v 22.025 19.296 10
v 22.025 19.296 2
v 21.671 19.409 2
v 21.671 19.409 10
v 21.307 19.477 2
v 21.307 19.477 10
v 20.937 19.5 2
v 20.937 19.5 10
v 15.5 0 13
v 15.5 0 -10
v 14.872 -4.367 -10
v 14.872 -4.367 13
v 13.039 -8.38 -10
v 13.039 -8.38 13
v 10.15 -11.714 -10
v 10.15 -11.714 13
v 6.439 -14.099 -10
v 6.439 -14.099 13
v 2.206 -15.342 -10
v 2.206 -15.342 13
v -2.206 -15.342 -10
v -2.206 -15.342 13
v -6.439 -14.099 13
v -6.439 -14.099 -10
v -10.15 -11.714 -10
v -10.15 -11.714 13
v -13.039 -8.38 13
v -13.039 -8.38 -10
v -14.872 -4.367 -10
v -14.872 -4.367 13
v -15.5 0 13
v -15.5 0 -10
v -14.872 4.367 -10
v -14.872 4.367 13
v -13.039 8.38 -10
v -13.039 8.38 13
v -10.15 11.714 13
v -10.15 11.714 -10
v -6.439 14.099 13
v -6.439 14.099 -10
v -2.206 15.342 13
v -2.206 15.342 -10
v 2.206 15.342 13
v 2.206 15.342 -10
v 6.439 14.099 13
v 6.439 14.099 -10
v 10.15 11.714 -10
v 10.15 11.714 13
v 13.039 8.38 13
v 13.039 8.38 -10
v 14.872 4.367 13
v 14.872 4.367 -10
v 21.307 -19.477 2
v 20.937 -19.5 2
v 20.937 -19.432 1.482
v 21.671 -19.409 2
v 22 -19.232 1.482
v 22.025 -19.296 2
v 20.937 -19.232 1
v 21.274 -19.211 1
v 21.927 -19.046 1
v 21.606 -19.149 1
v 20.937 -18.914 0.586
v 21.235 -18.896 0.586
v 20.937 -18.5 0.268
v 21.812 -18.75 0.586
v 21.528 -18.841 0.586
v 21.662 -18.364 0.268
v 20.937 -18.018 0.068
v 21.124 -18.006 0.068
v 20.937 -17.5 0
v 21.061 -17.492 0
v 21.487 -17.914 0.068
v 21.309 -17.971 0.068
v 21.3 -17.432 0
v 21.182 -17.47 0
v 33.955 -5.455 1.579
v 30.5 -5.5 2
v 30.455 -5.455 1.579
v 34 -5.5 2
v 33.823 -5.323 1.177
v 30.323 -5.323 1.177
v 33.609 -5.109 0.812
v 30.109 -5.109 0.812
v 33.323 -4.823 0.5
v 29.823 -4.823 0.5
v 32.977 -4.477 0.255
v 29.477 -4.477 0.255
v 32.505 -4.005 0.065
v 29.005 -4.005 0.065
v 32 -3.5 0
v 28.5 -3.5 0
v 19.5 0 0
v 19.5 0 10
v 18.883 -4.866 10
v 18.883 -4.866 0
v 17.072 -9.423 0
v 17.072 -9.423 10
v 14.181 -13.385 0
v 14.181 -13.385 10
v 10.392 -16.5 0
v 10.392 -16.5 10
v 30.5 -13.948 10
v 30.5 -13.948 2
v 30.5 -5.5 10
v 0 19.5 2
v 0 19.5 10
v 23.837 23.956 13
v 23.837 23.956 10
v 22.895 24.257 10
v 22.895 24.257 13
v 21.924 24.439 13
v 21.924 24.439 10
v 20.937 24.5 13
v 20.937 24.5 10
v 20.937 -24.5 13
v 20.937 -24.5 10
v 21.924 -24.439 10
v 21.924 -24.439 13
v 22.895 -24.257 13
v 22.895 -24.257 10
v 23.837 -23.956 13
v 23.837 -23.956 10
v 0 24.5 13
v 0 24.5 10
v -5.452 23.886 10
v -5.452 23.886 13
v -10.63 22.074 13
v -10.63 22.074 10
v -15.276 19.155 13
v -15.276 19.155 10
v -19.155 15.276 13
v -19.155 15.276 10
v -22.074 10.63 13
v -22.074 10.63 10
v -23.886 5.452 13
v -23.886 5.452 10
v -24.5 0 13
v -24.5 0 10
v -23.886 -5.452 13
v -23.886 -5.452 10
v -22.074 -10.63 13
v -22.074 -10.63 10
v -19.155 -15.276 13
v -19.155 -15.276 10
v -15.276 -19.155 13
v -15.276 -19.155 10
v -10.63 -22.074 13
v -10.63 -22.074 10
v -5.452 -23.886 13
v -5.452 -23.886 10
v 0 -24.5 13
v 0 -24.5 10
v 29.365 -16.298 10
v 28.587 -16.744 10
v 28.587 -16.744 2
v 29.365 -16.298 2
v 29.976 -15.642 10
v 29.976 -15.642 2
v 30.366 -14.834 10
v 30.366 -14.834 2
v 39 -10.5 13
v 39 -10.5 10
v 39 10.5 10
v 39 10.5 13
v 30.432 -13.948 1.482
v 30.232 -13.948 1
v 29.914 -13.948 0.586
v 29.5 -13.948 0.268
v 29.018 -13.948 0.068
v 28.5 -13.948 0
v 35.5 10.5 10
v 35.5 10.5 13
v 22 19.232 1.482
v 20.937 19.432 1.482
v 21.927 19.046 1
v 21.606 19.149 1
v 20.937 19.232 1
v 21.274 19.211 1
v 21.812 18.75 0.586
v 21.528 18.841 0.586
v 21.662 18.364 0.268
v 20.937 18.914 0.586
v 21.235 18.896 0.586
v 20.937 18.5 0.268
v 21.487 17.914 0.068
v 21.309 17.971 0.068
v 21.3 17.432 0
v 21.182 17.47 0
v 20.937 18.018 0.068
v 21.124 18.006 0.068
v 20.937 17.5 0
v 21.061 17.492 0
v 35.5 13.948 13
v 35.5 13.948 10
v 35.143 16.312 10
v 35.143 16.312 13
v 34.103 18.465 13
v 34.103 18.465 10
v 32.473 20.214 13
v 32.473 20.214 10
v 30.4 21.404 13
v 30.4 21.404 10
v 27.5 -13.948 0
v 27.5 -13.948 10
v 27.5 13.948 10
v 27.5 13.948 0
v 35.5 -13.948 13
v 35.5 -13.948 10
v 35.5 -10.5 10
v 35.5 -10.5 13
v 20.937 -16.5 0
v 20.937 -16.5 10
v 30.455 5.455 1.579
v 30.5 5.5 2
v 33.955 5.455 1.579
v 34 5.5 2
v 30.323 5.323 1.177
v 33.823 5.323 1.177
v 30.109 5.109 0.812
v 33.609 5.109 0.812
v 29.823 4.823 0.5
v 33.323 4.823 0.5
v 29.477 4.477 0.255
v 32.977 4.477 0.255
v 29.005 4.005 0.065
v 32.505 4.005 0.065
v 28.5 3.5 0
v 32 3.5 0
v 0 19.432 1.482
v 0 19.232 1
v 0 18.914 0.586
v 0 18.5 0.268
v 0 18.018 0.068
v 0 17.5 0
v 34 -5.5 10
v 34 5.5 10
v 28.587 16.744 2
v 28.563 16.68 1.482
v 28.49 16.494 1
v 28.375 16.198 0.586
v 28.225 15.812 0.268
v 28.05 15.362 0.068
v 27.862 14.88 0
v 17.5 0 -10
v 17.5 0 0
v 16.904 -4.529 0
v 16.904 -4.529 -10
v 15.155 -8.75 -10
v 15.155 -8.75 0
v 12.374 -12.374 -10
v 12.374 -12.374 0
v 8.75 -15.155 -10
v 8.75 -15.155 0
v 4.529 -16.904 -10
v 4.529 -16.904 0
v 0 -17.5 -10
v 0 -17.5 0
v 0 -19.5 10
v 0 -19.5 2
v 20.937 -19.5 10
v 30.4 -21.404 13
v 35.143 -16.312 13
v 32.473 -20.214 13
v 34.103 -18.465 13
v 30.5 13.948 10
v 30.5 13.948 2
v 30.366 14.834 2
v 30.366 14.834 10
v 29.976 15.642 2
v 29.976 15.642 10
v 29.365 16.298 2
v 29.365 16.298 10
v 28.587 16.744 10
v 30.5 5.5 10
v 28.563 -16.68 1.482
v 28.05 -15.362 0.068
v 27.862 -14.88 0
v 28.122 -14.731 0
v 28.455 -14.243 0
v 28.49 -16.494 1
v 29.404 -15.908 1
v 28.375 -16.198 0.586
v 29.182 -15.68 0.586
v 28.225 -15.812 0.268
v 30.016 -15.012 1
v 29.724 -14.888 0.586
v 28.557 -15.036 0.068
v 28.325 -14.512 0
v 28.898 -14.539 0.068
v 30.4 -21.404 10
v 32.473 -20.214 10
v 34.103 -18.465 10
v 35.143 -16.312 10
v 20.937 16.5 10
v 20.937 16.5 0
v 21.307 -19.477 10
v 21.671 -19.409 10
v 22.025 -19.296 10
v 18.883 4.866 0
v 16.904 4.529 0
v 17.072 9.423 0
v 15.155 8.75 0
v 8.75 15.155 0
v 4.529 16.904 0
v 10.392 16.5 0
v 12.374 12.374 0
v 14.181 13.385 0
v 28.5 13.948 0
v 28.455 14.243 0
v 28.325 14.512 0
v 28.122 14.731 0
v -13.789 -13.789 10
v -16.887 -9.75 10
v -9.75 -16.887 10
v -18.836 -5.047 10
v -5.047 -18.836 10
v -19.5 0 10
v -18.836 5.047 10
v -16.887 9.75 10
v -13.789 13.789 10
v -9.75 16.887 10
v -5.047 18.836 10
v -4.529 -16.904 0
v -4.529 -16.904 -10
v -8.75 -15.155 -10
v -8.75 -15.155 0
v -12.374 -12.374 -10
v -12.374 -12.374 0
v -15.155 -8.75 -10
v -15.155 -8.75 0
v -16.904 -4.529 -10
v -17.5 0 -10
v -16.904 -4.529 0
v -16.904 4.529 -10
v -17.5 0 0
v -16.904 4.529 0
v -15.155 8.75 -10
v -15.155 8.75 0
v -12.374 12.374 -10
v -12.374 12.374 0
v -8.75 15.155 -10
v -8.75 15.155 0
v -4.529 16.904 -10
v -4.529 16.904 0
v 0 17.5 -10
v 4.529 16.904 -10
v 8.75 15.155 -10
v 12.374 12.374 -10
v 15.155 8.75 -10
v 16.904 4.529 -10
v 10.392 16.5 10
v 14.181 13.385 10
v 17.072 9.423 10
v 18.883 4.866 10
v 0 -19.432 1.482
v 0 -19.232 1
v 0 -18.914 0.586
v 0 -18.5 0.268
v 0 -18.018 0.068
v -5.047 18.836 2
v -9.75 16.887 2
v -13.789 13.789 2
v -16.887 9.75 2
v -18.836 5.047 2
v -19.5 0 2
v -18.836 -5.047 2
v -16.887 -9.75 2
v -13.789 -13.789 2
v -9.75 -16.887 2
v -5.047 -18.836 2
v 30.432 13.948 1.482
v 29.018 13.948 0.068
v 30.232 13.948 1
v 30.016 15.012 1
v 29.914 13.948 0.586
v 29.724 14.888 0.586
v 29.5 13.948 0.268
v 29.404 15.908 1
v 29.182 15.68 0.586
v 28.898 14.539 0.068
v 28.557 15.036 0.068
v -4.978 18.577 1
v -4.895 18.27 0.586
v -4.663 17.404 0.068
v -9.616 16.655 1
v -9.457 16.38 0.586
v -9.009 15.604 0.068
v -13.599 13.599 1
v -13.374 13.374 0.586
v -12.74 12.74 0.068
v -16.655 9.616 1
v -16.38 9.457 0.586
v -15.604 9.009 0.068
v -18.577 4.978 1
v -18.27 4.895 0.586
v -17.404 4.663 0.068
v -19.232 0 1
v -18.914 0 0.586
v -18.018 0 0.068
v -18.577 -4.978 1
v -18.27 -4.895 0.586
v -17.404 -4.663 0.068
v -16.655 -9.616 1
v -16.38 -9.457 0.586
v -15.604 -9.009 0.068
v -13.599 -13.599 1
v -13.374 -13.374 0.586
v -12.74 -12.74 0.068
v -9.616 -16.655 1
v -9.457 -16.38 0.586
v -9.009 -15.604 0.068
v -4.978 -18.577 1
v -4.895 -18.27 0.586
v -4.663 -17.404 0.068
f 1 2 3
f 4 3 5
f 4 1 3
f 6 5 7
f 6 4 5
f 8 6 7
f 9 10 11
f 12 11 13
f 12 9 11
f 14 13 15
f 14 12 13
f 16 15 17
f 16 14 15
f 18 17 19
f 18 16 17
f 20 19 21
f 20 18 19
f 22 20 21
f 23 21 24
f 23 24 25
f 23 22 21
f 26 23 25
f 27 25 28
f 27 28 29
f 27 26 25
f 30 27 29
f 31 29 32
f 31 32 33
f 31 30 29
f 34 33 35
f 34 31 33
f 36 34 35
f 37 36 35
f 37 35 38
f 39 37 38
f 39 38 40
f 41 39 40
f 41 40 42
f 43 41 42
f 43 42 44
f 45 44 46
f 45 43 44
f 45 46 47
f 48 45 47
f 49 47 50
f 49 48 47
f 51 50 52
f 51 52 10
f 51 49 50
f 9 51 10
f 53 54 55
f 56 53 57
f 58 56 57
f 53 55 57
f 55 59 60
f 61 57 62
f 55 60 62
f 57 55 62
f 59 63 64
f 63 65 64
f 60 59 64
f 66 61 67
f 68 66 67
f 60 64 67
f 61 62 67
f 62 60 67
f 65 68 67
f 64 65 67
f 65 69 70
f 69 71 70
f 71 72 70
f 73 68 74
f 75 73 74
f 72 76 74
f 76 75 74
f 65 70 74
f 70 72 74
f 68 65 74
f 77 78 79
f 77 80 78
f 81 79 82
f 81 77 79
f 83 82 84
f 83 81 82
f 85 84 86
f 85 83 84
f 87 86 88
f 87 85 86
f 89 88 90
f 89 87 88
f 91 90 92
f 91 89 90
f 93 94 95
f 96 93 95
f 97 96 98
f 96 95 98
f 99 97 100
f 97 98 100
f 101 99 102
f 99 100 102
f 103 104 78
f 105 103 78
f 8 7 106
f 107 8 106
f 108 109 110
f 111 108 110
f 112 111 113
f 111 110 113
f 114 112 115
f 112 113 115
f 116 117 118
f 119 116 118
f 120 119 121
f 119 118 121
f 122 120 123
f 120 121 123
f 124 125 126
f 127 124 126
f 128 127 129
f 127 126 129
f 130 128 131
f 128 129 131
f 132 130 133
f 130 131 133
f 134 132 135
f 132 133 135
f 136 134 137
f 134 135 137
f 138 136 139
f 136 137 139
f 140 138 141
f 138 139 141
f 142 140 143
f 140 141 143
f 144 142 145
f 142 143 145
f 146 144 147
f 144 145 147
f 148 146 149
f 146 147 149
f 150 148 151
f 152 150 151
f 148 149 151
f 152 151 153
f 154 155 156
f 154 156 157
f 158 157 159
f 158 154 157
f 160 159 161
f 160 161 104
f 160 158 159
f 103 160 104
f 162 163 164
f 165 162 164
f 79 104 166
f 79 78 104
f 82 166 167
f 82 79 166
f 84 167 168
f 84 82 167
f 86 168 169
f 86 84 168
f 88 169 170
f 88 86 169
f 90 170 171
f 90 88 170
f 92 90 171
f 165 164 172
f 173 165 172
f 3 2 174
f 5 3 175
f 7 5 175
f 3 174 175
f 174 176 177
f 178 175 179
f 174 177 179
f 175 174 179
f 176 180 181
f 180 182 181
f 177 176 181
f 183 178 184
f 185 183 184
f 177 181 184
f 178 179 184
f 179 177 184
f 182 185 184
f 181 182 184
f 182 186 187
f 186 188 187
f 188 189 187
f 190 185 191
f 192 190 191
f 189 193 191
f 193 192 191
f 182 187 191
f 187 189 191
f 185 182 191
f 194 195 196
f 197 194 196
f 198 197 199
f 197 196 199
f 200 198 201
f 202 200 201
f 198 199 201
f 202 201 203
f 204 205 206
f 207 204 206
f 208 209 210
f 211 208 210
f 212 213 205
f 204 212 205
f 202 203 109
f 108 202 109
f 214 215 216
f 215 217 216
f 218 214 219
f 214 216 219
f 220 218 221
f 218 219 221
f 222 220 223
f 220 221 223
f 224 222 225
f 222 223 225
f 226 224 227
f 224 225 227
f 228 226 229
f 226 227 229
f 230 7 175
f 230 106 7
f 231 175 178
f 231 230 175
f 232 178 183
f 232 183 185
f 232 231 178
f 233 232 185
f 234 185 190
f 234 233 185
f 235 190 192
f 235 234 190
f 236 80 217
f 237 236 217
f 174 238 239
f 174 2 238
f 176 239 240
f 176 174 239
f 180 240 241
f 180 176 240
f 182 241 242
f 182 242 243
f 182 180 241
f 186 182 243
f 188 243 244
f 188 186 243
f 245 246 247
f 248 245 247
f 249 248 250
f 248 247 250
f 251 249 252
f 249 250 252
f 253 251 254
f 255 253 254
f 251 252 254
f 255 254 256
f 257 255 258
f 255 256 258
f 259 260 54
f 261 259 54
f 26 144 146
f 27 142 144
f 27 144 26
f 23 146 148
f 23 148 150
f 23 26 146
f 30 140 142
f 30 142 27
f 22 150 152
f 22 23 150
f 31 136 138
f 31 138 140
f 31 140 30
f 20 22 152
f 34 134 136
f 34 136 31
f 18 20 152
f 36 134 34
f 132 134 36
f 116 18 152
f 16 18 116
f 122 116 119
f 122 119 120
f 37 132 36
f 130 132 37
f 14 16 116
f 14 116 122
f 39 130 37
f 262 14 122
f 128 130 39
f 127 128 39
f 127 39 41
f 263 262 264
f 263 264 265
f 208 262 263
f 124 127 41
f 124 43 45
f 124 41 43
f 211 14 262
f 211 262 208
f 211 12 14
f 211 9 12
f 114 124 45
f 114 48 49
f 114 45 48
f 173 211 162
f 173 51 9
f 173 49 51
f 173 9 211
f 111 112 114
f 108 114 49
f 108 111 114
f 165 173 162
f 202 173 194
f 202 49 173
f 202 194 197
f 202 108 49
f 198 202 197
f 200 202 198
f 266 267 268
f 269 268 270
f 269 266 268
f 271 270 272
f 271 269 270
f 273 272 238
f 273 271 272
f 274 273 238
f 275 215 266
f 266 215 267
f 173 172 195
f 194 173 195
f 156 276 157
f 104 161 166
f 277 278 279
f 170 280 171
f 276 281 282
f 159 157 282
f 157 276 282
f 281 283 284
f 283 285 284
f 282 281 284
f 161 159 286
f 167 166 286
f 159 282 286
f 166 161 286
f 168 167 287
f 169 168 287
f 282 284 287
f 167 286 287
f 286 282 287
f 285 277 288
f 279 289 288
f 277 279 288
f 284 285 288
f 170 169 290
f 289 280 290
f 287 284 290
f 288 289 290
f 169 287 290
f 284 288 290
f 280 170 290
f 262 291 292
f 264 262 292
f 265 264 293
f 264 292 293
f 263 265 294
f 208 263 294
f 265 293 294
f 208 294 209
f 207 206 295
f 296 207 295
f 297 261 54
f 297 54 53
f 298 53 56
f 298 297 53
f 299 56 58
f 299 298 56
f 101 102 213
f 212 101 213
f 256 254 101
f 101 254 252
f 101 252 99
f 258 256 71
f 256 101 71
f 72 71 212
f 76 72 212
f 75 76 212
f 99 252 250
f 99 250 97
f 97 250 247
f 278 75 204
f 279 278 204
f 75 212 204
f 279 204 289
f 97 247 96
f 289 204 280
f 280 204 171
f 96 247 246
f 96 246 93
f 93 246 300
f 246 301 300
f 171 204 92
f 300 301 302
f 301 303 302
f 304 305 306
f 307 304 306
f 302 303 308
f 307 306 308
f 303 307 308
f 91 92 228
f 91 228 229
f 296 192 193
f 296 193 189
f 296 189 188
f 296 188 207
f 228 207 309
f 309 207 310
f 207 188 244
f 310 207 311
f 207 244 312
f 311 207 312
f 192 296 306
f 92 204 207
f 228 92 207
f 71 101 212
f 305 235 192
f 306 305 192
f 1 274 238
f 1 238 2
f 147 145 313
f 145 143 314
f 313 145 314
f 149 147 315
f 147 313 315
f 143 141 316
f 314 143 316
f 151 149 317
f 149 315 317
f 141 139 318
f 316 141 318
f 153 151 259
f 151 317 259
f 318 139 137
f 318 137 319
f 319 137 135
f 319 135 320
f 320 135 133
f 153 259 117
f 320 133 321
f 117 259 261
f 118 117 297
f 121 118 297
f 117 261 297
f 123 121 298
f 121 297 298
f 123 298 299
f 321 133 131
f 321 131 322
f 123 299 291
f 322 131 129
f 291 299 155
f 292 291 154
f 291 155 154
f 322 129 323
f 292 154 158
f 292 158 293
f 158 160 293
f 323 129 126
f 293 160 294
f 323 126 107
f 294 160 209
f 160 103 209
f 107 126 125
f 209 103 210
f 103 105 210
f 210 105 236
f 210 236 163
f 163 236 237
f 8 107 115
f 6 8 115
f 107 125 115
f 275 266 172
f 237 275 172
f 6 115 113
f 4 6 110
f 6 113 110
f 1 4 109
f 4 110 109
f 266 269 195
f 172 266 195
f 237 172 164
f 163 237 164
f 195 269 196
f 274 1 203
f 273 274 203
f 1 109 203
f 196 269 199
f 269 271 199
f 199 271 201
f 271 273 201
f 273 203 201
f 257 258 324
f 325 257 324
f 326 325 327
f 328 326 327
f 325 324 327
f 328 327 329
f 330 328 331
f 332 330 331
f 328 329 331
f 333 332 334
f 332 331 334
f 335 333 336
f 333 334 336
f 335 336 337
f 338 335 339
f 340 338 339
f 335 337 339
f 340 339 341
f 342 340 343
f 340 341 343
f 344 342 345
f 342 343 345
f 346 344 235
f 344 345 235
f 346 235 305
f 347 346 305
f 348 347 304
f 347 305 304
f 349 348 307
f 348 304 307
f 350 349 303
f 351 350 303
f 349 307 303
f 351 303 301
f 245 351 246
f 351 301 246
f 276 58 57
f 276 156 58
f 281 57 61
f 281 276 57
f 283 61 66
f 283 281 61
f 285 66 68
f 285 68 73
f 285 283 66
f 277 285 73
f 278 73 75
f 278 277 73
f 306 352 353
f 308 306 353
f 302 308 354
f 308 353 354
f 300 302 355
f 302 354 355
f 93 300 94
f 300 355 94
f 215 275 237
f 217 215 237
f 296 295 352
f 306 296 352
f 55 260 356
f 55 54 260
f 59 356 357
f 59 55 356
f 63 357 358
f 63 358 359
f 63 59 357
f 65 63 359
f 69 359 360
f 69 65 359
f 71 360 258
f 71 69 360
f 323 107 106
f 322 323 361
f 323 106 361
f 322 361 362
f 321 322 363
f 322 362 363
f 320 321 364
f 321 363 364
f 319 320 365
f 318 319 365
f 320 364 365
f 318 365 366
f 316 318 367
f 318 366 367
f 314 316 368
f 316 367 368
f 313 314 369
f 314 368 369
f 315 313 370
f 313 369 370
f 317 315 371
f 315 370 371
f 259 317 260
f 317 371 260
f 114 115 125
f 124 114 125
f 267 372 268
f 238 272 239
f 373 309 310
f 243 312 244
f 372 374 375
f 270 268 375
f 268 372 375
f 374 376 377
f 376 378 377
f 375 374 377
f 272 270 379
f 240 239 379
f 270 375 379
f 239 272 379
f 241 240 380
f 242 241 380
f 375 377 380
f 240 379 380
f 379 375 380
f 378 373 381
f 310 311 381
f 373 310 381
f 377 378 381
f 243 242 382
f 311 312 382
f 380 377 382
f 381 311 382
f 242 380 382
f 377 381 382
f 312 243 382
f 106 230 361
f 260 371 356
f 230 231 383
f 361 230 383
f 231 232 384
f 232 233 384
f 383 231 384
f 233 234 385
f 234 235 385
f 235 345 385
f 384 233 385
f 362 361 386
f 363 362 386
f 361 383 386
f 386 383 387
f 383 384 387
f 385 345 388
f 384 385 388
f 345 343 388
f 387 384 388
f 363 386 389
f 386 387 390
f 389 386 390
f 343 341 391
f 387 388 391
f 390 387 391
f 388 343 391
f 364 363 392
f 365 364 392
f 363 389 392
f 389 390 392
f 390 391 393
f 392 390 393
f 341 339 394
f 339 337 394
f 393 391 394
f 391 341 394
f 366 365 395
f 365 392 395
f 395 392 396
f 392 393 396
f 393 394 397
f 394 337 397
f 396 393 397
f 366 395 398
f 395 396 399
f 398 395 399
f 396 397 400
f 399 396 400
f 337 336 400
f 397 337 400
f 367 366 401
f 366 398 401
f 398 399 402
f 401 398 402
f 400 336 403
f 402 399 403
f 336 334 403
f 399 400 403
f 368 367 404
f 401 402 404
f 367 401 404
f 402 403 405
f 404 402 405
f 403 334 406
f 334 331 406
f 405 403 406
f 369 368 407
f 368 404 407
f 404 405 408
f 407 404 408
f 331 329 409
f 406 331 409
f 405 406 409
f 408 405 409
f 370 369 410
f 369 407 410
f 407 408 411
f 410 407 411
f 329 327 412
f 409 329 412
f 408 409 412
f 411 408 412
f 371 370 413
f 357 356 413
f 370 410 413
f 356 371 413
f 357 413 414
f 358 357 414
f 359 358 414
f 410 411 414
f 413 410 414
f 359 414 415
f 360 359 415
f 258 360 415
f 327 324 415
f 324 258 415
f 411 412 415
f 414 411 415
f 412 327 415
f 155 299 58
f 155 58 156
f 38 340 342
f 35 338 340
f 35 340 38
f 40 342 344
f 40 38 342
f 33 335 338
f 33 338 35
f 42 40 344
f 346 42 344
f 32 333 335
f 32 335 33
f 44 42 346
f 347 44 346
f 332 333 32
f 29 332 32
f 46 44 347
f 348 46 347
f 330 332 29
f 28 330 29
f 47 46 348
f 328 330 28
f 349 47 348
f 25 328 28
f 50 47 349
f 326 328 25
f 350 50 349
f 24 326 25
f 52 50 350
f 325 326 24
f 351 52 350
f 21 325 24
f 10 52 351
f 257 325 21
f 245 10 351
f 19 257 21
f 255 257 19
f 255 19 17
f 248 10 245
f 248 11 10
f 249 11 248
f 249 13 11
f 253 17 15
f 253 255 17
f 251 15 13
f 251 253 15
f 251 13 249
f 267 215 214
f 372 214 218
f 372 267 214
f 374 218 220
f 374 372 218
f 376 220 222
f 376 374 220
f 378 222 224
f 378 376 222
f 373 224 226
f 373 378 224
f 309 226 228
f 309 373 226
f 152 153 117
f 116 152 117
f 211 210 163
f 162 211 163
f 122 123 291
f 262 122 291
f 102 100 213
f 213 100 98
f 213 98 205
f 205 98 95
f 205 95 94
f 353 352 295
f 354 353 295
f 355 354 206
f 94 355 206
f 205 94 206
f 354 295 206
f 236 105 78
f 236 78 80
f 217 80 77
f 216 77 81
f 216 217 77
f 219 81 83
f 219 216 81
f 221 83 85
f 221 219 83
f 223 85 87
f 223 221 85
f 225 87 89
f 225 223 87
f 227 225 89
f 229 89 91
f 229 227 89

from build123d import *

# Parameters (mm, degrees)
F0_W     = 3.5
F0_H     = 11
F1_DEPTH = 10
F2_R     = 3
F3_R     = 15.5
F4_DEPTH = 25
F3_W     = 3.5
F3_H     = 5
F5_DEPTH = 3
F6_R     = 2
F7_R     = 15.5
F8_DEPTH = 10


with BuildPart() as f1:
    # F0 (on Top) → F1 (new body)
    with BuildSketch(Plane.XY):
        with BuildLine():
            ThreePointArc((0, -19.5), (13.7885822331, -13.7885822331), (19.5, 0))
            ThreePointArc((19.5, 0), (13.7885822331, 13.7885822331), (0, 19.5))
            ThreePointArc((0, 19.5), (-19.5, 0), (0, -19.5))
        make_face()
        with BuildLine():
            ThreePointArc((0, 19.5), (13.7885822331, 13.7885822331), (19.5, 0))
            ThreePointArc((19.5, 0), (13.7885822331, -13.7885822331), (0, -19.5))
            Line((0, -19.5), (21.5, -19.5))
            Line((21.5, -19.5), (21.5, 19.5))
            Line((21.5, 19.5), (0, 19.5))
        make_face()
        Polygon((30.5, 16), (21.5, 19.5), (21.5, -19.5), (30.5, -16), (30.5, -5.5), (30.5, 5.5), align=None)
        with Locations((32.25, 0)):
            Rectangle(F0_W, F0_H)
    extrude(amount=F1_DEPTH)

    # F2
    f2_edges = [f1.edges().sort_by_distance(p)[0] for p in [
        (30.5, 16, 5),
        (21.5, 19.5, 5),
        (30.5, -16, 5),
        (21.5, -19.5, 5),
    ]]
    fillet(f2_edges, radius=F2_R)

    # F3 (on face) → F4 (cut)
    with BuildSketch(Plane.XY.offset(10)):
        Circle(F3_R)
        with BuildLine():
            Line((20.9371966075, 16.5), (10.3923048454, 16.5))
            ThreePointArc((10.3923048454, 16.5), (17.0719059347, 9.4233766643), (19.5, 0))
            ThreePointArc((19.5, 0), (17.0719059347, -9.4233766643), (10.3923048454, -16.5))
            Line((10.3923048454, -16.5), (20.9371966075, -16.5))
            Line((20.9371966075, -16.5), (27.5, -13.9477986807))
            Line((27.5, -13.9477986807), (27.5, -2.5))
            Line((27.5, -2.5), (27.5, 2.5))
            Line((27.5, 2.5), (27.5, 13.9477986807))
            Line((27.5, 13.9477986807), (20.9371966075, 16.5))
        make_face()
    extrude(amount=-F4_DEPTH, mode=Mode.SUBTRACT)

    # F3 (on face) → F5 (join)
    with BuildSketch(Plane.XY.offset(10)):
        with BuildLine():
            Line((20.9371966075, 24.5), (0, 24.5))
            ThreePointArc((0, 24.5), (-24.5, 0), (0, -24.5))
            Line((0, -24.5), (20.9371966075, -24.5))
            ThreePointArc((20.9371966075, -24.5), (22.4122730498, -24.3628334263), (23.8367666967, -23.9560373723))
            Line((23.8367666967, -23.9560373723), (30.3995700892, -21.403836053))
            ThreePointArc((30.3995700892, -21.403836053), (34.1028993902, -18.4646249606), (35.5, -13.9477986807))
            Line((35.5, -13.9477986807), (35.5, -10.5))
            Line((35.5, -10.5), (39, -10.5))
            Line((39, -10.5), (39, 10.5))
            Line((39, 10.5), (35.5, 10.5))
            Line((35.5, 10.5), (35.5, 13.9477986807))
            ThreePointArc((35.5, 13.9477986807), (34.1028993902, 18.4646249606), (30.3995700892, 21.403836053))
            Line((30.3995700892, 21.403836053), (23.8367666967, 23.9560373723))
            ThreePointArc((23.8367666967, 23.9560373723), (22.4122730498, 24.3628334263), (20.9371966075, 24.5))
        make_face()
        with BuildLine():
            ThreePointArc((0, -19.5), (-19.5, 0), (0, 19.5))
            Line((0, 19.5), (20.9371966075, 19.5))
            ThreePointArc((20.9371966075, 19.5), (21.4903502734, 19.4485625349), (22.024535391, 19.2960140146))
            Line((22.024535391, 19.2960140146), (28.5873387835, 16.7438126953))
            ThreePointArc((28.5873387835, 16.7438126953), (29.9760872713, 15.6416085357), (30.5, 13.9477986807))
            Line((30.5, 13.9477986807), (30.5, 5.5))
            Line((30.5, 5.5), (34, 5.5))
            Line((34, 5.5), (34, -5.5))
            Line((34, -5.5), (30.5, -5.5))
            Line((30.5, -5.5), (30.5, -13.9477986807))
            ThreePointArc((30.5, -13.9477986807), (29.9760872713, -15.6416085357), (28.5873387835, -16.7438126953))
            Line((28.5873387835, -16.7438126953), (22.024535391, -19.2960140146))
            ThreePointArc((22.024535391, -19.2960140146), (21.4903502734, -19.4485625349), (20.9371966075, -19.5))
            Line((20.9371966075, -19.5), (0, -19.5))
        make_face(mode=Mode.SUBTRACT)
        with BuildLine():
            ThreePointArc((0, -16.5), (-16.5, 0), (0, 16.5))
            Line((0, 16.5), (10.3923048454, 16.5))
            ThreePointArc((10.3923048454, 16.5), (5.4083269132, 18.7349939952), (0, 19.5))
            ThreePointArc((0, 19.5), (-19.5, 0), (0, -19.5))
            ThreePointArc((0, -19.5), (5.4083269132, -18.7349939952), (10.3923048454, -16.5))
            Line((10.3923048454, -16.5), (0, -16.5))
        make_face()
        with Locations((29.25, 0)):
            Rectangle(F3_W, F3_H)
        with BuildLine():
            ThreePointArc((0, 19.5), (5.4083269132, 18.7349939952), (10.3923048454, 16.5))
            Line((10.3923048454, 16.5), (20.9371966075, 16.5))
            Line((20.9371966075, 16.5), (27.5, 13.9477986807))
            Line((27.5, 13.9477986807), (27.5, 2.5))
            Line((27.5, 2.5), (31, 2.5))
            Line((31, 2.5), (31, -2.5))
            Line((31, -2.5), (27.5, -2.5))
            Line((27.5, -2.5), (27.5, -13.9477986807))
            Line((27.5, -13.9477986807), (20.9371966075, -16.5))
            Line((20.9371966075, -16.5), (10.3923048454, -16.5))
            ThreePointArc((10.3923048454, -16.5), (5.4083269132, -18.7349939952), (0, -19.5))
            Line((0, -19.5), (20.9371966075, -19.5))
            ThreePointArc((20.9371966075, -19.5), (21.4903502734, -19.4485625349), (22.024535391, -19.2960140146))
            Line((22.024535391, -19.2960140146), (28.5873387835, -16.7438126953))
            ThreePointArc((28.5873387835, -16.7438126953), (29.9760872713, -15.6416085357), (30.5, -13.9477986807))
            Line((30.5, -13.9477986807), (30.5, -5.5))
            Line((30.5, -5.5), (34, -5.5))
            Line((34, -5.5), (34, 5.5))
            Line((34, 5.5), (30.5, 5.5))
            Line((30.5, 5.5), (30.5, 13.9477986807))
            ThreePointArc((30.5, 13.9477986807), (29.9760872713, 15.6416085357), (28.5873387835, 16.7438126953))
            Line((28.5873387835, 16.7438126953), (22.024535391, 19.2960140146))
            ThreePointArc((22.024535391, 19.2960140146), (21.4903502734, 19.4485625349), (20.9371966075, 19.5))
            Line((20.9371966075, 19.5), (0, 19.5))
        make_face()
        with BuildLine():
            Line((20.9371966075, 16.5), (10.3923048454, 16.5))
            ThreePointArc((10.3923048454, 16.5), (17.0719059347, 9.4233766643), (19.5, 0))
            ThreePointArc((19.5, 0), (17.0719059347, -9.4233766643), (10.3923048454, -16.5))
            Line((10.3923048454, -16.5), (20.9371966075, -16.5))
            Line((20.9371966075, -16.5), (27.5, -13.9477986807))
            Line((27.5, -13.9477986807), (27.5, -2.5))
            Line((27.5, -2.5), (27.5, 2.5))
            Line((27.5, 2.5), (27.5, 13.9477986807))
            Line((27.5, 13.9477986807), (20.9371966075, 16.5))
        make_face()
        with BuildLine():
            Line((10.3923048454, 16.5), (0, 16.5))
            ThreePointArc((0, 16.5), (11.6672618896, 11.6672618896), (16.5, 0))
            ThreePointArc((16.5, 0), (11.6672618896, -11.6672618896), (0, -16.5))
            Line((0, -16.5), (10.3923048454, -16.5))
            ThreePointArc((10.3923048454, -16.5), (17.0719059347, -9.4233766643), (19.5, 0))
            ThreePointArc((19.5, 0), (17.0719059347, 9.4233766643), (10.3923048454, 16.5))
        make_face()
        with BuildLine():
            ThreePointArc((16.5, 0), (11.6672618896, 11.6672618896), (0, 16.5))
            ThreePointArc((0, 16.5), (-16.5, 0), (0, -16.5))
            ThreePointArc((0, -16.5), (11.6672618896, -11.6672618896), (16.5, 0))
        make_face()
        Circle(F3_R, mode=Mode.SUBTRACT)
    extrude(amount=F5_DEPTH)

    # F6
    f6_edges = [f1.edges().sort_by_distance(p)[0] for p in [
        (-19.5, 0, 0),
        (10.468598, -19.5, 0),
        (25.305937, -18.019913, 0),
        (30.5, -9.723899, 0),
        (29.976087, -15.641609, 0),
        (34, 0, 0),
        (32.25, 5.5, 0),
        (30.5, 9.723899, 0),
        (21.49035, -19.448563, 0),
        (10.468598, 19.5, 0),
        (25.305937, 18.019913, 0),
        (29.976087, 15.641609, 0),
        (21.49035, 19.448563, 0),
        (32.25, -5.5, 0),
    ]]
    fillet(f6_edges, radius=F6_R)

    # F7 (on face) → F8 (join)
    with BuildSketch(Plane(origin=(0, 0, 0), x_dir=(1, 0, 0), z_dir=(0, 0, -1))):
        with BuildLine():
            ThreePointArc((0, -17.5), (12.3743686708, -12.3743686708), (17.5, 0))
            ThreePointArc((17.5, 0), (12.3743686708, 12.3743686708), (0, 17.5))
            ThreePointArc((0, 17.5), (-17.5, 0), (0, -17.5))
        make_face()
        Circle(F7_R, mode=Mode.SUBTRACT)
    extrude(amount=F8_DEPTH)


solid = f1.part
